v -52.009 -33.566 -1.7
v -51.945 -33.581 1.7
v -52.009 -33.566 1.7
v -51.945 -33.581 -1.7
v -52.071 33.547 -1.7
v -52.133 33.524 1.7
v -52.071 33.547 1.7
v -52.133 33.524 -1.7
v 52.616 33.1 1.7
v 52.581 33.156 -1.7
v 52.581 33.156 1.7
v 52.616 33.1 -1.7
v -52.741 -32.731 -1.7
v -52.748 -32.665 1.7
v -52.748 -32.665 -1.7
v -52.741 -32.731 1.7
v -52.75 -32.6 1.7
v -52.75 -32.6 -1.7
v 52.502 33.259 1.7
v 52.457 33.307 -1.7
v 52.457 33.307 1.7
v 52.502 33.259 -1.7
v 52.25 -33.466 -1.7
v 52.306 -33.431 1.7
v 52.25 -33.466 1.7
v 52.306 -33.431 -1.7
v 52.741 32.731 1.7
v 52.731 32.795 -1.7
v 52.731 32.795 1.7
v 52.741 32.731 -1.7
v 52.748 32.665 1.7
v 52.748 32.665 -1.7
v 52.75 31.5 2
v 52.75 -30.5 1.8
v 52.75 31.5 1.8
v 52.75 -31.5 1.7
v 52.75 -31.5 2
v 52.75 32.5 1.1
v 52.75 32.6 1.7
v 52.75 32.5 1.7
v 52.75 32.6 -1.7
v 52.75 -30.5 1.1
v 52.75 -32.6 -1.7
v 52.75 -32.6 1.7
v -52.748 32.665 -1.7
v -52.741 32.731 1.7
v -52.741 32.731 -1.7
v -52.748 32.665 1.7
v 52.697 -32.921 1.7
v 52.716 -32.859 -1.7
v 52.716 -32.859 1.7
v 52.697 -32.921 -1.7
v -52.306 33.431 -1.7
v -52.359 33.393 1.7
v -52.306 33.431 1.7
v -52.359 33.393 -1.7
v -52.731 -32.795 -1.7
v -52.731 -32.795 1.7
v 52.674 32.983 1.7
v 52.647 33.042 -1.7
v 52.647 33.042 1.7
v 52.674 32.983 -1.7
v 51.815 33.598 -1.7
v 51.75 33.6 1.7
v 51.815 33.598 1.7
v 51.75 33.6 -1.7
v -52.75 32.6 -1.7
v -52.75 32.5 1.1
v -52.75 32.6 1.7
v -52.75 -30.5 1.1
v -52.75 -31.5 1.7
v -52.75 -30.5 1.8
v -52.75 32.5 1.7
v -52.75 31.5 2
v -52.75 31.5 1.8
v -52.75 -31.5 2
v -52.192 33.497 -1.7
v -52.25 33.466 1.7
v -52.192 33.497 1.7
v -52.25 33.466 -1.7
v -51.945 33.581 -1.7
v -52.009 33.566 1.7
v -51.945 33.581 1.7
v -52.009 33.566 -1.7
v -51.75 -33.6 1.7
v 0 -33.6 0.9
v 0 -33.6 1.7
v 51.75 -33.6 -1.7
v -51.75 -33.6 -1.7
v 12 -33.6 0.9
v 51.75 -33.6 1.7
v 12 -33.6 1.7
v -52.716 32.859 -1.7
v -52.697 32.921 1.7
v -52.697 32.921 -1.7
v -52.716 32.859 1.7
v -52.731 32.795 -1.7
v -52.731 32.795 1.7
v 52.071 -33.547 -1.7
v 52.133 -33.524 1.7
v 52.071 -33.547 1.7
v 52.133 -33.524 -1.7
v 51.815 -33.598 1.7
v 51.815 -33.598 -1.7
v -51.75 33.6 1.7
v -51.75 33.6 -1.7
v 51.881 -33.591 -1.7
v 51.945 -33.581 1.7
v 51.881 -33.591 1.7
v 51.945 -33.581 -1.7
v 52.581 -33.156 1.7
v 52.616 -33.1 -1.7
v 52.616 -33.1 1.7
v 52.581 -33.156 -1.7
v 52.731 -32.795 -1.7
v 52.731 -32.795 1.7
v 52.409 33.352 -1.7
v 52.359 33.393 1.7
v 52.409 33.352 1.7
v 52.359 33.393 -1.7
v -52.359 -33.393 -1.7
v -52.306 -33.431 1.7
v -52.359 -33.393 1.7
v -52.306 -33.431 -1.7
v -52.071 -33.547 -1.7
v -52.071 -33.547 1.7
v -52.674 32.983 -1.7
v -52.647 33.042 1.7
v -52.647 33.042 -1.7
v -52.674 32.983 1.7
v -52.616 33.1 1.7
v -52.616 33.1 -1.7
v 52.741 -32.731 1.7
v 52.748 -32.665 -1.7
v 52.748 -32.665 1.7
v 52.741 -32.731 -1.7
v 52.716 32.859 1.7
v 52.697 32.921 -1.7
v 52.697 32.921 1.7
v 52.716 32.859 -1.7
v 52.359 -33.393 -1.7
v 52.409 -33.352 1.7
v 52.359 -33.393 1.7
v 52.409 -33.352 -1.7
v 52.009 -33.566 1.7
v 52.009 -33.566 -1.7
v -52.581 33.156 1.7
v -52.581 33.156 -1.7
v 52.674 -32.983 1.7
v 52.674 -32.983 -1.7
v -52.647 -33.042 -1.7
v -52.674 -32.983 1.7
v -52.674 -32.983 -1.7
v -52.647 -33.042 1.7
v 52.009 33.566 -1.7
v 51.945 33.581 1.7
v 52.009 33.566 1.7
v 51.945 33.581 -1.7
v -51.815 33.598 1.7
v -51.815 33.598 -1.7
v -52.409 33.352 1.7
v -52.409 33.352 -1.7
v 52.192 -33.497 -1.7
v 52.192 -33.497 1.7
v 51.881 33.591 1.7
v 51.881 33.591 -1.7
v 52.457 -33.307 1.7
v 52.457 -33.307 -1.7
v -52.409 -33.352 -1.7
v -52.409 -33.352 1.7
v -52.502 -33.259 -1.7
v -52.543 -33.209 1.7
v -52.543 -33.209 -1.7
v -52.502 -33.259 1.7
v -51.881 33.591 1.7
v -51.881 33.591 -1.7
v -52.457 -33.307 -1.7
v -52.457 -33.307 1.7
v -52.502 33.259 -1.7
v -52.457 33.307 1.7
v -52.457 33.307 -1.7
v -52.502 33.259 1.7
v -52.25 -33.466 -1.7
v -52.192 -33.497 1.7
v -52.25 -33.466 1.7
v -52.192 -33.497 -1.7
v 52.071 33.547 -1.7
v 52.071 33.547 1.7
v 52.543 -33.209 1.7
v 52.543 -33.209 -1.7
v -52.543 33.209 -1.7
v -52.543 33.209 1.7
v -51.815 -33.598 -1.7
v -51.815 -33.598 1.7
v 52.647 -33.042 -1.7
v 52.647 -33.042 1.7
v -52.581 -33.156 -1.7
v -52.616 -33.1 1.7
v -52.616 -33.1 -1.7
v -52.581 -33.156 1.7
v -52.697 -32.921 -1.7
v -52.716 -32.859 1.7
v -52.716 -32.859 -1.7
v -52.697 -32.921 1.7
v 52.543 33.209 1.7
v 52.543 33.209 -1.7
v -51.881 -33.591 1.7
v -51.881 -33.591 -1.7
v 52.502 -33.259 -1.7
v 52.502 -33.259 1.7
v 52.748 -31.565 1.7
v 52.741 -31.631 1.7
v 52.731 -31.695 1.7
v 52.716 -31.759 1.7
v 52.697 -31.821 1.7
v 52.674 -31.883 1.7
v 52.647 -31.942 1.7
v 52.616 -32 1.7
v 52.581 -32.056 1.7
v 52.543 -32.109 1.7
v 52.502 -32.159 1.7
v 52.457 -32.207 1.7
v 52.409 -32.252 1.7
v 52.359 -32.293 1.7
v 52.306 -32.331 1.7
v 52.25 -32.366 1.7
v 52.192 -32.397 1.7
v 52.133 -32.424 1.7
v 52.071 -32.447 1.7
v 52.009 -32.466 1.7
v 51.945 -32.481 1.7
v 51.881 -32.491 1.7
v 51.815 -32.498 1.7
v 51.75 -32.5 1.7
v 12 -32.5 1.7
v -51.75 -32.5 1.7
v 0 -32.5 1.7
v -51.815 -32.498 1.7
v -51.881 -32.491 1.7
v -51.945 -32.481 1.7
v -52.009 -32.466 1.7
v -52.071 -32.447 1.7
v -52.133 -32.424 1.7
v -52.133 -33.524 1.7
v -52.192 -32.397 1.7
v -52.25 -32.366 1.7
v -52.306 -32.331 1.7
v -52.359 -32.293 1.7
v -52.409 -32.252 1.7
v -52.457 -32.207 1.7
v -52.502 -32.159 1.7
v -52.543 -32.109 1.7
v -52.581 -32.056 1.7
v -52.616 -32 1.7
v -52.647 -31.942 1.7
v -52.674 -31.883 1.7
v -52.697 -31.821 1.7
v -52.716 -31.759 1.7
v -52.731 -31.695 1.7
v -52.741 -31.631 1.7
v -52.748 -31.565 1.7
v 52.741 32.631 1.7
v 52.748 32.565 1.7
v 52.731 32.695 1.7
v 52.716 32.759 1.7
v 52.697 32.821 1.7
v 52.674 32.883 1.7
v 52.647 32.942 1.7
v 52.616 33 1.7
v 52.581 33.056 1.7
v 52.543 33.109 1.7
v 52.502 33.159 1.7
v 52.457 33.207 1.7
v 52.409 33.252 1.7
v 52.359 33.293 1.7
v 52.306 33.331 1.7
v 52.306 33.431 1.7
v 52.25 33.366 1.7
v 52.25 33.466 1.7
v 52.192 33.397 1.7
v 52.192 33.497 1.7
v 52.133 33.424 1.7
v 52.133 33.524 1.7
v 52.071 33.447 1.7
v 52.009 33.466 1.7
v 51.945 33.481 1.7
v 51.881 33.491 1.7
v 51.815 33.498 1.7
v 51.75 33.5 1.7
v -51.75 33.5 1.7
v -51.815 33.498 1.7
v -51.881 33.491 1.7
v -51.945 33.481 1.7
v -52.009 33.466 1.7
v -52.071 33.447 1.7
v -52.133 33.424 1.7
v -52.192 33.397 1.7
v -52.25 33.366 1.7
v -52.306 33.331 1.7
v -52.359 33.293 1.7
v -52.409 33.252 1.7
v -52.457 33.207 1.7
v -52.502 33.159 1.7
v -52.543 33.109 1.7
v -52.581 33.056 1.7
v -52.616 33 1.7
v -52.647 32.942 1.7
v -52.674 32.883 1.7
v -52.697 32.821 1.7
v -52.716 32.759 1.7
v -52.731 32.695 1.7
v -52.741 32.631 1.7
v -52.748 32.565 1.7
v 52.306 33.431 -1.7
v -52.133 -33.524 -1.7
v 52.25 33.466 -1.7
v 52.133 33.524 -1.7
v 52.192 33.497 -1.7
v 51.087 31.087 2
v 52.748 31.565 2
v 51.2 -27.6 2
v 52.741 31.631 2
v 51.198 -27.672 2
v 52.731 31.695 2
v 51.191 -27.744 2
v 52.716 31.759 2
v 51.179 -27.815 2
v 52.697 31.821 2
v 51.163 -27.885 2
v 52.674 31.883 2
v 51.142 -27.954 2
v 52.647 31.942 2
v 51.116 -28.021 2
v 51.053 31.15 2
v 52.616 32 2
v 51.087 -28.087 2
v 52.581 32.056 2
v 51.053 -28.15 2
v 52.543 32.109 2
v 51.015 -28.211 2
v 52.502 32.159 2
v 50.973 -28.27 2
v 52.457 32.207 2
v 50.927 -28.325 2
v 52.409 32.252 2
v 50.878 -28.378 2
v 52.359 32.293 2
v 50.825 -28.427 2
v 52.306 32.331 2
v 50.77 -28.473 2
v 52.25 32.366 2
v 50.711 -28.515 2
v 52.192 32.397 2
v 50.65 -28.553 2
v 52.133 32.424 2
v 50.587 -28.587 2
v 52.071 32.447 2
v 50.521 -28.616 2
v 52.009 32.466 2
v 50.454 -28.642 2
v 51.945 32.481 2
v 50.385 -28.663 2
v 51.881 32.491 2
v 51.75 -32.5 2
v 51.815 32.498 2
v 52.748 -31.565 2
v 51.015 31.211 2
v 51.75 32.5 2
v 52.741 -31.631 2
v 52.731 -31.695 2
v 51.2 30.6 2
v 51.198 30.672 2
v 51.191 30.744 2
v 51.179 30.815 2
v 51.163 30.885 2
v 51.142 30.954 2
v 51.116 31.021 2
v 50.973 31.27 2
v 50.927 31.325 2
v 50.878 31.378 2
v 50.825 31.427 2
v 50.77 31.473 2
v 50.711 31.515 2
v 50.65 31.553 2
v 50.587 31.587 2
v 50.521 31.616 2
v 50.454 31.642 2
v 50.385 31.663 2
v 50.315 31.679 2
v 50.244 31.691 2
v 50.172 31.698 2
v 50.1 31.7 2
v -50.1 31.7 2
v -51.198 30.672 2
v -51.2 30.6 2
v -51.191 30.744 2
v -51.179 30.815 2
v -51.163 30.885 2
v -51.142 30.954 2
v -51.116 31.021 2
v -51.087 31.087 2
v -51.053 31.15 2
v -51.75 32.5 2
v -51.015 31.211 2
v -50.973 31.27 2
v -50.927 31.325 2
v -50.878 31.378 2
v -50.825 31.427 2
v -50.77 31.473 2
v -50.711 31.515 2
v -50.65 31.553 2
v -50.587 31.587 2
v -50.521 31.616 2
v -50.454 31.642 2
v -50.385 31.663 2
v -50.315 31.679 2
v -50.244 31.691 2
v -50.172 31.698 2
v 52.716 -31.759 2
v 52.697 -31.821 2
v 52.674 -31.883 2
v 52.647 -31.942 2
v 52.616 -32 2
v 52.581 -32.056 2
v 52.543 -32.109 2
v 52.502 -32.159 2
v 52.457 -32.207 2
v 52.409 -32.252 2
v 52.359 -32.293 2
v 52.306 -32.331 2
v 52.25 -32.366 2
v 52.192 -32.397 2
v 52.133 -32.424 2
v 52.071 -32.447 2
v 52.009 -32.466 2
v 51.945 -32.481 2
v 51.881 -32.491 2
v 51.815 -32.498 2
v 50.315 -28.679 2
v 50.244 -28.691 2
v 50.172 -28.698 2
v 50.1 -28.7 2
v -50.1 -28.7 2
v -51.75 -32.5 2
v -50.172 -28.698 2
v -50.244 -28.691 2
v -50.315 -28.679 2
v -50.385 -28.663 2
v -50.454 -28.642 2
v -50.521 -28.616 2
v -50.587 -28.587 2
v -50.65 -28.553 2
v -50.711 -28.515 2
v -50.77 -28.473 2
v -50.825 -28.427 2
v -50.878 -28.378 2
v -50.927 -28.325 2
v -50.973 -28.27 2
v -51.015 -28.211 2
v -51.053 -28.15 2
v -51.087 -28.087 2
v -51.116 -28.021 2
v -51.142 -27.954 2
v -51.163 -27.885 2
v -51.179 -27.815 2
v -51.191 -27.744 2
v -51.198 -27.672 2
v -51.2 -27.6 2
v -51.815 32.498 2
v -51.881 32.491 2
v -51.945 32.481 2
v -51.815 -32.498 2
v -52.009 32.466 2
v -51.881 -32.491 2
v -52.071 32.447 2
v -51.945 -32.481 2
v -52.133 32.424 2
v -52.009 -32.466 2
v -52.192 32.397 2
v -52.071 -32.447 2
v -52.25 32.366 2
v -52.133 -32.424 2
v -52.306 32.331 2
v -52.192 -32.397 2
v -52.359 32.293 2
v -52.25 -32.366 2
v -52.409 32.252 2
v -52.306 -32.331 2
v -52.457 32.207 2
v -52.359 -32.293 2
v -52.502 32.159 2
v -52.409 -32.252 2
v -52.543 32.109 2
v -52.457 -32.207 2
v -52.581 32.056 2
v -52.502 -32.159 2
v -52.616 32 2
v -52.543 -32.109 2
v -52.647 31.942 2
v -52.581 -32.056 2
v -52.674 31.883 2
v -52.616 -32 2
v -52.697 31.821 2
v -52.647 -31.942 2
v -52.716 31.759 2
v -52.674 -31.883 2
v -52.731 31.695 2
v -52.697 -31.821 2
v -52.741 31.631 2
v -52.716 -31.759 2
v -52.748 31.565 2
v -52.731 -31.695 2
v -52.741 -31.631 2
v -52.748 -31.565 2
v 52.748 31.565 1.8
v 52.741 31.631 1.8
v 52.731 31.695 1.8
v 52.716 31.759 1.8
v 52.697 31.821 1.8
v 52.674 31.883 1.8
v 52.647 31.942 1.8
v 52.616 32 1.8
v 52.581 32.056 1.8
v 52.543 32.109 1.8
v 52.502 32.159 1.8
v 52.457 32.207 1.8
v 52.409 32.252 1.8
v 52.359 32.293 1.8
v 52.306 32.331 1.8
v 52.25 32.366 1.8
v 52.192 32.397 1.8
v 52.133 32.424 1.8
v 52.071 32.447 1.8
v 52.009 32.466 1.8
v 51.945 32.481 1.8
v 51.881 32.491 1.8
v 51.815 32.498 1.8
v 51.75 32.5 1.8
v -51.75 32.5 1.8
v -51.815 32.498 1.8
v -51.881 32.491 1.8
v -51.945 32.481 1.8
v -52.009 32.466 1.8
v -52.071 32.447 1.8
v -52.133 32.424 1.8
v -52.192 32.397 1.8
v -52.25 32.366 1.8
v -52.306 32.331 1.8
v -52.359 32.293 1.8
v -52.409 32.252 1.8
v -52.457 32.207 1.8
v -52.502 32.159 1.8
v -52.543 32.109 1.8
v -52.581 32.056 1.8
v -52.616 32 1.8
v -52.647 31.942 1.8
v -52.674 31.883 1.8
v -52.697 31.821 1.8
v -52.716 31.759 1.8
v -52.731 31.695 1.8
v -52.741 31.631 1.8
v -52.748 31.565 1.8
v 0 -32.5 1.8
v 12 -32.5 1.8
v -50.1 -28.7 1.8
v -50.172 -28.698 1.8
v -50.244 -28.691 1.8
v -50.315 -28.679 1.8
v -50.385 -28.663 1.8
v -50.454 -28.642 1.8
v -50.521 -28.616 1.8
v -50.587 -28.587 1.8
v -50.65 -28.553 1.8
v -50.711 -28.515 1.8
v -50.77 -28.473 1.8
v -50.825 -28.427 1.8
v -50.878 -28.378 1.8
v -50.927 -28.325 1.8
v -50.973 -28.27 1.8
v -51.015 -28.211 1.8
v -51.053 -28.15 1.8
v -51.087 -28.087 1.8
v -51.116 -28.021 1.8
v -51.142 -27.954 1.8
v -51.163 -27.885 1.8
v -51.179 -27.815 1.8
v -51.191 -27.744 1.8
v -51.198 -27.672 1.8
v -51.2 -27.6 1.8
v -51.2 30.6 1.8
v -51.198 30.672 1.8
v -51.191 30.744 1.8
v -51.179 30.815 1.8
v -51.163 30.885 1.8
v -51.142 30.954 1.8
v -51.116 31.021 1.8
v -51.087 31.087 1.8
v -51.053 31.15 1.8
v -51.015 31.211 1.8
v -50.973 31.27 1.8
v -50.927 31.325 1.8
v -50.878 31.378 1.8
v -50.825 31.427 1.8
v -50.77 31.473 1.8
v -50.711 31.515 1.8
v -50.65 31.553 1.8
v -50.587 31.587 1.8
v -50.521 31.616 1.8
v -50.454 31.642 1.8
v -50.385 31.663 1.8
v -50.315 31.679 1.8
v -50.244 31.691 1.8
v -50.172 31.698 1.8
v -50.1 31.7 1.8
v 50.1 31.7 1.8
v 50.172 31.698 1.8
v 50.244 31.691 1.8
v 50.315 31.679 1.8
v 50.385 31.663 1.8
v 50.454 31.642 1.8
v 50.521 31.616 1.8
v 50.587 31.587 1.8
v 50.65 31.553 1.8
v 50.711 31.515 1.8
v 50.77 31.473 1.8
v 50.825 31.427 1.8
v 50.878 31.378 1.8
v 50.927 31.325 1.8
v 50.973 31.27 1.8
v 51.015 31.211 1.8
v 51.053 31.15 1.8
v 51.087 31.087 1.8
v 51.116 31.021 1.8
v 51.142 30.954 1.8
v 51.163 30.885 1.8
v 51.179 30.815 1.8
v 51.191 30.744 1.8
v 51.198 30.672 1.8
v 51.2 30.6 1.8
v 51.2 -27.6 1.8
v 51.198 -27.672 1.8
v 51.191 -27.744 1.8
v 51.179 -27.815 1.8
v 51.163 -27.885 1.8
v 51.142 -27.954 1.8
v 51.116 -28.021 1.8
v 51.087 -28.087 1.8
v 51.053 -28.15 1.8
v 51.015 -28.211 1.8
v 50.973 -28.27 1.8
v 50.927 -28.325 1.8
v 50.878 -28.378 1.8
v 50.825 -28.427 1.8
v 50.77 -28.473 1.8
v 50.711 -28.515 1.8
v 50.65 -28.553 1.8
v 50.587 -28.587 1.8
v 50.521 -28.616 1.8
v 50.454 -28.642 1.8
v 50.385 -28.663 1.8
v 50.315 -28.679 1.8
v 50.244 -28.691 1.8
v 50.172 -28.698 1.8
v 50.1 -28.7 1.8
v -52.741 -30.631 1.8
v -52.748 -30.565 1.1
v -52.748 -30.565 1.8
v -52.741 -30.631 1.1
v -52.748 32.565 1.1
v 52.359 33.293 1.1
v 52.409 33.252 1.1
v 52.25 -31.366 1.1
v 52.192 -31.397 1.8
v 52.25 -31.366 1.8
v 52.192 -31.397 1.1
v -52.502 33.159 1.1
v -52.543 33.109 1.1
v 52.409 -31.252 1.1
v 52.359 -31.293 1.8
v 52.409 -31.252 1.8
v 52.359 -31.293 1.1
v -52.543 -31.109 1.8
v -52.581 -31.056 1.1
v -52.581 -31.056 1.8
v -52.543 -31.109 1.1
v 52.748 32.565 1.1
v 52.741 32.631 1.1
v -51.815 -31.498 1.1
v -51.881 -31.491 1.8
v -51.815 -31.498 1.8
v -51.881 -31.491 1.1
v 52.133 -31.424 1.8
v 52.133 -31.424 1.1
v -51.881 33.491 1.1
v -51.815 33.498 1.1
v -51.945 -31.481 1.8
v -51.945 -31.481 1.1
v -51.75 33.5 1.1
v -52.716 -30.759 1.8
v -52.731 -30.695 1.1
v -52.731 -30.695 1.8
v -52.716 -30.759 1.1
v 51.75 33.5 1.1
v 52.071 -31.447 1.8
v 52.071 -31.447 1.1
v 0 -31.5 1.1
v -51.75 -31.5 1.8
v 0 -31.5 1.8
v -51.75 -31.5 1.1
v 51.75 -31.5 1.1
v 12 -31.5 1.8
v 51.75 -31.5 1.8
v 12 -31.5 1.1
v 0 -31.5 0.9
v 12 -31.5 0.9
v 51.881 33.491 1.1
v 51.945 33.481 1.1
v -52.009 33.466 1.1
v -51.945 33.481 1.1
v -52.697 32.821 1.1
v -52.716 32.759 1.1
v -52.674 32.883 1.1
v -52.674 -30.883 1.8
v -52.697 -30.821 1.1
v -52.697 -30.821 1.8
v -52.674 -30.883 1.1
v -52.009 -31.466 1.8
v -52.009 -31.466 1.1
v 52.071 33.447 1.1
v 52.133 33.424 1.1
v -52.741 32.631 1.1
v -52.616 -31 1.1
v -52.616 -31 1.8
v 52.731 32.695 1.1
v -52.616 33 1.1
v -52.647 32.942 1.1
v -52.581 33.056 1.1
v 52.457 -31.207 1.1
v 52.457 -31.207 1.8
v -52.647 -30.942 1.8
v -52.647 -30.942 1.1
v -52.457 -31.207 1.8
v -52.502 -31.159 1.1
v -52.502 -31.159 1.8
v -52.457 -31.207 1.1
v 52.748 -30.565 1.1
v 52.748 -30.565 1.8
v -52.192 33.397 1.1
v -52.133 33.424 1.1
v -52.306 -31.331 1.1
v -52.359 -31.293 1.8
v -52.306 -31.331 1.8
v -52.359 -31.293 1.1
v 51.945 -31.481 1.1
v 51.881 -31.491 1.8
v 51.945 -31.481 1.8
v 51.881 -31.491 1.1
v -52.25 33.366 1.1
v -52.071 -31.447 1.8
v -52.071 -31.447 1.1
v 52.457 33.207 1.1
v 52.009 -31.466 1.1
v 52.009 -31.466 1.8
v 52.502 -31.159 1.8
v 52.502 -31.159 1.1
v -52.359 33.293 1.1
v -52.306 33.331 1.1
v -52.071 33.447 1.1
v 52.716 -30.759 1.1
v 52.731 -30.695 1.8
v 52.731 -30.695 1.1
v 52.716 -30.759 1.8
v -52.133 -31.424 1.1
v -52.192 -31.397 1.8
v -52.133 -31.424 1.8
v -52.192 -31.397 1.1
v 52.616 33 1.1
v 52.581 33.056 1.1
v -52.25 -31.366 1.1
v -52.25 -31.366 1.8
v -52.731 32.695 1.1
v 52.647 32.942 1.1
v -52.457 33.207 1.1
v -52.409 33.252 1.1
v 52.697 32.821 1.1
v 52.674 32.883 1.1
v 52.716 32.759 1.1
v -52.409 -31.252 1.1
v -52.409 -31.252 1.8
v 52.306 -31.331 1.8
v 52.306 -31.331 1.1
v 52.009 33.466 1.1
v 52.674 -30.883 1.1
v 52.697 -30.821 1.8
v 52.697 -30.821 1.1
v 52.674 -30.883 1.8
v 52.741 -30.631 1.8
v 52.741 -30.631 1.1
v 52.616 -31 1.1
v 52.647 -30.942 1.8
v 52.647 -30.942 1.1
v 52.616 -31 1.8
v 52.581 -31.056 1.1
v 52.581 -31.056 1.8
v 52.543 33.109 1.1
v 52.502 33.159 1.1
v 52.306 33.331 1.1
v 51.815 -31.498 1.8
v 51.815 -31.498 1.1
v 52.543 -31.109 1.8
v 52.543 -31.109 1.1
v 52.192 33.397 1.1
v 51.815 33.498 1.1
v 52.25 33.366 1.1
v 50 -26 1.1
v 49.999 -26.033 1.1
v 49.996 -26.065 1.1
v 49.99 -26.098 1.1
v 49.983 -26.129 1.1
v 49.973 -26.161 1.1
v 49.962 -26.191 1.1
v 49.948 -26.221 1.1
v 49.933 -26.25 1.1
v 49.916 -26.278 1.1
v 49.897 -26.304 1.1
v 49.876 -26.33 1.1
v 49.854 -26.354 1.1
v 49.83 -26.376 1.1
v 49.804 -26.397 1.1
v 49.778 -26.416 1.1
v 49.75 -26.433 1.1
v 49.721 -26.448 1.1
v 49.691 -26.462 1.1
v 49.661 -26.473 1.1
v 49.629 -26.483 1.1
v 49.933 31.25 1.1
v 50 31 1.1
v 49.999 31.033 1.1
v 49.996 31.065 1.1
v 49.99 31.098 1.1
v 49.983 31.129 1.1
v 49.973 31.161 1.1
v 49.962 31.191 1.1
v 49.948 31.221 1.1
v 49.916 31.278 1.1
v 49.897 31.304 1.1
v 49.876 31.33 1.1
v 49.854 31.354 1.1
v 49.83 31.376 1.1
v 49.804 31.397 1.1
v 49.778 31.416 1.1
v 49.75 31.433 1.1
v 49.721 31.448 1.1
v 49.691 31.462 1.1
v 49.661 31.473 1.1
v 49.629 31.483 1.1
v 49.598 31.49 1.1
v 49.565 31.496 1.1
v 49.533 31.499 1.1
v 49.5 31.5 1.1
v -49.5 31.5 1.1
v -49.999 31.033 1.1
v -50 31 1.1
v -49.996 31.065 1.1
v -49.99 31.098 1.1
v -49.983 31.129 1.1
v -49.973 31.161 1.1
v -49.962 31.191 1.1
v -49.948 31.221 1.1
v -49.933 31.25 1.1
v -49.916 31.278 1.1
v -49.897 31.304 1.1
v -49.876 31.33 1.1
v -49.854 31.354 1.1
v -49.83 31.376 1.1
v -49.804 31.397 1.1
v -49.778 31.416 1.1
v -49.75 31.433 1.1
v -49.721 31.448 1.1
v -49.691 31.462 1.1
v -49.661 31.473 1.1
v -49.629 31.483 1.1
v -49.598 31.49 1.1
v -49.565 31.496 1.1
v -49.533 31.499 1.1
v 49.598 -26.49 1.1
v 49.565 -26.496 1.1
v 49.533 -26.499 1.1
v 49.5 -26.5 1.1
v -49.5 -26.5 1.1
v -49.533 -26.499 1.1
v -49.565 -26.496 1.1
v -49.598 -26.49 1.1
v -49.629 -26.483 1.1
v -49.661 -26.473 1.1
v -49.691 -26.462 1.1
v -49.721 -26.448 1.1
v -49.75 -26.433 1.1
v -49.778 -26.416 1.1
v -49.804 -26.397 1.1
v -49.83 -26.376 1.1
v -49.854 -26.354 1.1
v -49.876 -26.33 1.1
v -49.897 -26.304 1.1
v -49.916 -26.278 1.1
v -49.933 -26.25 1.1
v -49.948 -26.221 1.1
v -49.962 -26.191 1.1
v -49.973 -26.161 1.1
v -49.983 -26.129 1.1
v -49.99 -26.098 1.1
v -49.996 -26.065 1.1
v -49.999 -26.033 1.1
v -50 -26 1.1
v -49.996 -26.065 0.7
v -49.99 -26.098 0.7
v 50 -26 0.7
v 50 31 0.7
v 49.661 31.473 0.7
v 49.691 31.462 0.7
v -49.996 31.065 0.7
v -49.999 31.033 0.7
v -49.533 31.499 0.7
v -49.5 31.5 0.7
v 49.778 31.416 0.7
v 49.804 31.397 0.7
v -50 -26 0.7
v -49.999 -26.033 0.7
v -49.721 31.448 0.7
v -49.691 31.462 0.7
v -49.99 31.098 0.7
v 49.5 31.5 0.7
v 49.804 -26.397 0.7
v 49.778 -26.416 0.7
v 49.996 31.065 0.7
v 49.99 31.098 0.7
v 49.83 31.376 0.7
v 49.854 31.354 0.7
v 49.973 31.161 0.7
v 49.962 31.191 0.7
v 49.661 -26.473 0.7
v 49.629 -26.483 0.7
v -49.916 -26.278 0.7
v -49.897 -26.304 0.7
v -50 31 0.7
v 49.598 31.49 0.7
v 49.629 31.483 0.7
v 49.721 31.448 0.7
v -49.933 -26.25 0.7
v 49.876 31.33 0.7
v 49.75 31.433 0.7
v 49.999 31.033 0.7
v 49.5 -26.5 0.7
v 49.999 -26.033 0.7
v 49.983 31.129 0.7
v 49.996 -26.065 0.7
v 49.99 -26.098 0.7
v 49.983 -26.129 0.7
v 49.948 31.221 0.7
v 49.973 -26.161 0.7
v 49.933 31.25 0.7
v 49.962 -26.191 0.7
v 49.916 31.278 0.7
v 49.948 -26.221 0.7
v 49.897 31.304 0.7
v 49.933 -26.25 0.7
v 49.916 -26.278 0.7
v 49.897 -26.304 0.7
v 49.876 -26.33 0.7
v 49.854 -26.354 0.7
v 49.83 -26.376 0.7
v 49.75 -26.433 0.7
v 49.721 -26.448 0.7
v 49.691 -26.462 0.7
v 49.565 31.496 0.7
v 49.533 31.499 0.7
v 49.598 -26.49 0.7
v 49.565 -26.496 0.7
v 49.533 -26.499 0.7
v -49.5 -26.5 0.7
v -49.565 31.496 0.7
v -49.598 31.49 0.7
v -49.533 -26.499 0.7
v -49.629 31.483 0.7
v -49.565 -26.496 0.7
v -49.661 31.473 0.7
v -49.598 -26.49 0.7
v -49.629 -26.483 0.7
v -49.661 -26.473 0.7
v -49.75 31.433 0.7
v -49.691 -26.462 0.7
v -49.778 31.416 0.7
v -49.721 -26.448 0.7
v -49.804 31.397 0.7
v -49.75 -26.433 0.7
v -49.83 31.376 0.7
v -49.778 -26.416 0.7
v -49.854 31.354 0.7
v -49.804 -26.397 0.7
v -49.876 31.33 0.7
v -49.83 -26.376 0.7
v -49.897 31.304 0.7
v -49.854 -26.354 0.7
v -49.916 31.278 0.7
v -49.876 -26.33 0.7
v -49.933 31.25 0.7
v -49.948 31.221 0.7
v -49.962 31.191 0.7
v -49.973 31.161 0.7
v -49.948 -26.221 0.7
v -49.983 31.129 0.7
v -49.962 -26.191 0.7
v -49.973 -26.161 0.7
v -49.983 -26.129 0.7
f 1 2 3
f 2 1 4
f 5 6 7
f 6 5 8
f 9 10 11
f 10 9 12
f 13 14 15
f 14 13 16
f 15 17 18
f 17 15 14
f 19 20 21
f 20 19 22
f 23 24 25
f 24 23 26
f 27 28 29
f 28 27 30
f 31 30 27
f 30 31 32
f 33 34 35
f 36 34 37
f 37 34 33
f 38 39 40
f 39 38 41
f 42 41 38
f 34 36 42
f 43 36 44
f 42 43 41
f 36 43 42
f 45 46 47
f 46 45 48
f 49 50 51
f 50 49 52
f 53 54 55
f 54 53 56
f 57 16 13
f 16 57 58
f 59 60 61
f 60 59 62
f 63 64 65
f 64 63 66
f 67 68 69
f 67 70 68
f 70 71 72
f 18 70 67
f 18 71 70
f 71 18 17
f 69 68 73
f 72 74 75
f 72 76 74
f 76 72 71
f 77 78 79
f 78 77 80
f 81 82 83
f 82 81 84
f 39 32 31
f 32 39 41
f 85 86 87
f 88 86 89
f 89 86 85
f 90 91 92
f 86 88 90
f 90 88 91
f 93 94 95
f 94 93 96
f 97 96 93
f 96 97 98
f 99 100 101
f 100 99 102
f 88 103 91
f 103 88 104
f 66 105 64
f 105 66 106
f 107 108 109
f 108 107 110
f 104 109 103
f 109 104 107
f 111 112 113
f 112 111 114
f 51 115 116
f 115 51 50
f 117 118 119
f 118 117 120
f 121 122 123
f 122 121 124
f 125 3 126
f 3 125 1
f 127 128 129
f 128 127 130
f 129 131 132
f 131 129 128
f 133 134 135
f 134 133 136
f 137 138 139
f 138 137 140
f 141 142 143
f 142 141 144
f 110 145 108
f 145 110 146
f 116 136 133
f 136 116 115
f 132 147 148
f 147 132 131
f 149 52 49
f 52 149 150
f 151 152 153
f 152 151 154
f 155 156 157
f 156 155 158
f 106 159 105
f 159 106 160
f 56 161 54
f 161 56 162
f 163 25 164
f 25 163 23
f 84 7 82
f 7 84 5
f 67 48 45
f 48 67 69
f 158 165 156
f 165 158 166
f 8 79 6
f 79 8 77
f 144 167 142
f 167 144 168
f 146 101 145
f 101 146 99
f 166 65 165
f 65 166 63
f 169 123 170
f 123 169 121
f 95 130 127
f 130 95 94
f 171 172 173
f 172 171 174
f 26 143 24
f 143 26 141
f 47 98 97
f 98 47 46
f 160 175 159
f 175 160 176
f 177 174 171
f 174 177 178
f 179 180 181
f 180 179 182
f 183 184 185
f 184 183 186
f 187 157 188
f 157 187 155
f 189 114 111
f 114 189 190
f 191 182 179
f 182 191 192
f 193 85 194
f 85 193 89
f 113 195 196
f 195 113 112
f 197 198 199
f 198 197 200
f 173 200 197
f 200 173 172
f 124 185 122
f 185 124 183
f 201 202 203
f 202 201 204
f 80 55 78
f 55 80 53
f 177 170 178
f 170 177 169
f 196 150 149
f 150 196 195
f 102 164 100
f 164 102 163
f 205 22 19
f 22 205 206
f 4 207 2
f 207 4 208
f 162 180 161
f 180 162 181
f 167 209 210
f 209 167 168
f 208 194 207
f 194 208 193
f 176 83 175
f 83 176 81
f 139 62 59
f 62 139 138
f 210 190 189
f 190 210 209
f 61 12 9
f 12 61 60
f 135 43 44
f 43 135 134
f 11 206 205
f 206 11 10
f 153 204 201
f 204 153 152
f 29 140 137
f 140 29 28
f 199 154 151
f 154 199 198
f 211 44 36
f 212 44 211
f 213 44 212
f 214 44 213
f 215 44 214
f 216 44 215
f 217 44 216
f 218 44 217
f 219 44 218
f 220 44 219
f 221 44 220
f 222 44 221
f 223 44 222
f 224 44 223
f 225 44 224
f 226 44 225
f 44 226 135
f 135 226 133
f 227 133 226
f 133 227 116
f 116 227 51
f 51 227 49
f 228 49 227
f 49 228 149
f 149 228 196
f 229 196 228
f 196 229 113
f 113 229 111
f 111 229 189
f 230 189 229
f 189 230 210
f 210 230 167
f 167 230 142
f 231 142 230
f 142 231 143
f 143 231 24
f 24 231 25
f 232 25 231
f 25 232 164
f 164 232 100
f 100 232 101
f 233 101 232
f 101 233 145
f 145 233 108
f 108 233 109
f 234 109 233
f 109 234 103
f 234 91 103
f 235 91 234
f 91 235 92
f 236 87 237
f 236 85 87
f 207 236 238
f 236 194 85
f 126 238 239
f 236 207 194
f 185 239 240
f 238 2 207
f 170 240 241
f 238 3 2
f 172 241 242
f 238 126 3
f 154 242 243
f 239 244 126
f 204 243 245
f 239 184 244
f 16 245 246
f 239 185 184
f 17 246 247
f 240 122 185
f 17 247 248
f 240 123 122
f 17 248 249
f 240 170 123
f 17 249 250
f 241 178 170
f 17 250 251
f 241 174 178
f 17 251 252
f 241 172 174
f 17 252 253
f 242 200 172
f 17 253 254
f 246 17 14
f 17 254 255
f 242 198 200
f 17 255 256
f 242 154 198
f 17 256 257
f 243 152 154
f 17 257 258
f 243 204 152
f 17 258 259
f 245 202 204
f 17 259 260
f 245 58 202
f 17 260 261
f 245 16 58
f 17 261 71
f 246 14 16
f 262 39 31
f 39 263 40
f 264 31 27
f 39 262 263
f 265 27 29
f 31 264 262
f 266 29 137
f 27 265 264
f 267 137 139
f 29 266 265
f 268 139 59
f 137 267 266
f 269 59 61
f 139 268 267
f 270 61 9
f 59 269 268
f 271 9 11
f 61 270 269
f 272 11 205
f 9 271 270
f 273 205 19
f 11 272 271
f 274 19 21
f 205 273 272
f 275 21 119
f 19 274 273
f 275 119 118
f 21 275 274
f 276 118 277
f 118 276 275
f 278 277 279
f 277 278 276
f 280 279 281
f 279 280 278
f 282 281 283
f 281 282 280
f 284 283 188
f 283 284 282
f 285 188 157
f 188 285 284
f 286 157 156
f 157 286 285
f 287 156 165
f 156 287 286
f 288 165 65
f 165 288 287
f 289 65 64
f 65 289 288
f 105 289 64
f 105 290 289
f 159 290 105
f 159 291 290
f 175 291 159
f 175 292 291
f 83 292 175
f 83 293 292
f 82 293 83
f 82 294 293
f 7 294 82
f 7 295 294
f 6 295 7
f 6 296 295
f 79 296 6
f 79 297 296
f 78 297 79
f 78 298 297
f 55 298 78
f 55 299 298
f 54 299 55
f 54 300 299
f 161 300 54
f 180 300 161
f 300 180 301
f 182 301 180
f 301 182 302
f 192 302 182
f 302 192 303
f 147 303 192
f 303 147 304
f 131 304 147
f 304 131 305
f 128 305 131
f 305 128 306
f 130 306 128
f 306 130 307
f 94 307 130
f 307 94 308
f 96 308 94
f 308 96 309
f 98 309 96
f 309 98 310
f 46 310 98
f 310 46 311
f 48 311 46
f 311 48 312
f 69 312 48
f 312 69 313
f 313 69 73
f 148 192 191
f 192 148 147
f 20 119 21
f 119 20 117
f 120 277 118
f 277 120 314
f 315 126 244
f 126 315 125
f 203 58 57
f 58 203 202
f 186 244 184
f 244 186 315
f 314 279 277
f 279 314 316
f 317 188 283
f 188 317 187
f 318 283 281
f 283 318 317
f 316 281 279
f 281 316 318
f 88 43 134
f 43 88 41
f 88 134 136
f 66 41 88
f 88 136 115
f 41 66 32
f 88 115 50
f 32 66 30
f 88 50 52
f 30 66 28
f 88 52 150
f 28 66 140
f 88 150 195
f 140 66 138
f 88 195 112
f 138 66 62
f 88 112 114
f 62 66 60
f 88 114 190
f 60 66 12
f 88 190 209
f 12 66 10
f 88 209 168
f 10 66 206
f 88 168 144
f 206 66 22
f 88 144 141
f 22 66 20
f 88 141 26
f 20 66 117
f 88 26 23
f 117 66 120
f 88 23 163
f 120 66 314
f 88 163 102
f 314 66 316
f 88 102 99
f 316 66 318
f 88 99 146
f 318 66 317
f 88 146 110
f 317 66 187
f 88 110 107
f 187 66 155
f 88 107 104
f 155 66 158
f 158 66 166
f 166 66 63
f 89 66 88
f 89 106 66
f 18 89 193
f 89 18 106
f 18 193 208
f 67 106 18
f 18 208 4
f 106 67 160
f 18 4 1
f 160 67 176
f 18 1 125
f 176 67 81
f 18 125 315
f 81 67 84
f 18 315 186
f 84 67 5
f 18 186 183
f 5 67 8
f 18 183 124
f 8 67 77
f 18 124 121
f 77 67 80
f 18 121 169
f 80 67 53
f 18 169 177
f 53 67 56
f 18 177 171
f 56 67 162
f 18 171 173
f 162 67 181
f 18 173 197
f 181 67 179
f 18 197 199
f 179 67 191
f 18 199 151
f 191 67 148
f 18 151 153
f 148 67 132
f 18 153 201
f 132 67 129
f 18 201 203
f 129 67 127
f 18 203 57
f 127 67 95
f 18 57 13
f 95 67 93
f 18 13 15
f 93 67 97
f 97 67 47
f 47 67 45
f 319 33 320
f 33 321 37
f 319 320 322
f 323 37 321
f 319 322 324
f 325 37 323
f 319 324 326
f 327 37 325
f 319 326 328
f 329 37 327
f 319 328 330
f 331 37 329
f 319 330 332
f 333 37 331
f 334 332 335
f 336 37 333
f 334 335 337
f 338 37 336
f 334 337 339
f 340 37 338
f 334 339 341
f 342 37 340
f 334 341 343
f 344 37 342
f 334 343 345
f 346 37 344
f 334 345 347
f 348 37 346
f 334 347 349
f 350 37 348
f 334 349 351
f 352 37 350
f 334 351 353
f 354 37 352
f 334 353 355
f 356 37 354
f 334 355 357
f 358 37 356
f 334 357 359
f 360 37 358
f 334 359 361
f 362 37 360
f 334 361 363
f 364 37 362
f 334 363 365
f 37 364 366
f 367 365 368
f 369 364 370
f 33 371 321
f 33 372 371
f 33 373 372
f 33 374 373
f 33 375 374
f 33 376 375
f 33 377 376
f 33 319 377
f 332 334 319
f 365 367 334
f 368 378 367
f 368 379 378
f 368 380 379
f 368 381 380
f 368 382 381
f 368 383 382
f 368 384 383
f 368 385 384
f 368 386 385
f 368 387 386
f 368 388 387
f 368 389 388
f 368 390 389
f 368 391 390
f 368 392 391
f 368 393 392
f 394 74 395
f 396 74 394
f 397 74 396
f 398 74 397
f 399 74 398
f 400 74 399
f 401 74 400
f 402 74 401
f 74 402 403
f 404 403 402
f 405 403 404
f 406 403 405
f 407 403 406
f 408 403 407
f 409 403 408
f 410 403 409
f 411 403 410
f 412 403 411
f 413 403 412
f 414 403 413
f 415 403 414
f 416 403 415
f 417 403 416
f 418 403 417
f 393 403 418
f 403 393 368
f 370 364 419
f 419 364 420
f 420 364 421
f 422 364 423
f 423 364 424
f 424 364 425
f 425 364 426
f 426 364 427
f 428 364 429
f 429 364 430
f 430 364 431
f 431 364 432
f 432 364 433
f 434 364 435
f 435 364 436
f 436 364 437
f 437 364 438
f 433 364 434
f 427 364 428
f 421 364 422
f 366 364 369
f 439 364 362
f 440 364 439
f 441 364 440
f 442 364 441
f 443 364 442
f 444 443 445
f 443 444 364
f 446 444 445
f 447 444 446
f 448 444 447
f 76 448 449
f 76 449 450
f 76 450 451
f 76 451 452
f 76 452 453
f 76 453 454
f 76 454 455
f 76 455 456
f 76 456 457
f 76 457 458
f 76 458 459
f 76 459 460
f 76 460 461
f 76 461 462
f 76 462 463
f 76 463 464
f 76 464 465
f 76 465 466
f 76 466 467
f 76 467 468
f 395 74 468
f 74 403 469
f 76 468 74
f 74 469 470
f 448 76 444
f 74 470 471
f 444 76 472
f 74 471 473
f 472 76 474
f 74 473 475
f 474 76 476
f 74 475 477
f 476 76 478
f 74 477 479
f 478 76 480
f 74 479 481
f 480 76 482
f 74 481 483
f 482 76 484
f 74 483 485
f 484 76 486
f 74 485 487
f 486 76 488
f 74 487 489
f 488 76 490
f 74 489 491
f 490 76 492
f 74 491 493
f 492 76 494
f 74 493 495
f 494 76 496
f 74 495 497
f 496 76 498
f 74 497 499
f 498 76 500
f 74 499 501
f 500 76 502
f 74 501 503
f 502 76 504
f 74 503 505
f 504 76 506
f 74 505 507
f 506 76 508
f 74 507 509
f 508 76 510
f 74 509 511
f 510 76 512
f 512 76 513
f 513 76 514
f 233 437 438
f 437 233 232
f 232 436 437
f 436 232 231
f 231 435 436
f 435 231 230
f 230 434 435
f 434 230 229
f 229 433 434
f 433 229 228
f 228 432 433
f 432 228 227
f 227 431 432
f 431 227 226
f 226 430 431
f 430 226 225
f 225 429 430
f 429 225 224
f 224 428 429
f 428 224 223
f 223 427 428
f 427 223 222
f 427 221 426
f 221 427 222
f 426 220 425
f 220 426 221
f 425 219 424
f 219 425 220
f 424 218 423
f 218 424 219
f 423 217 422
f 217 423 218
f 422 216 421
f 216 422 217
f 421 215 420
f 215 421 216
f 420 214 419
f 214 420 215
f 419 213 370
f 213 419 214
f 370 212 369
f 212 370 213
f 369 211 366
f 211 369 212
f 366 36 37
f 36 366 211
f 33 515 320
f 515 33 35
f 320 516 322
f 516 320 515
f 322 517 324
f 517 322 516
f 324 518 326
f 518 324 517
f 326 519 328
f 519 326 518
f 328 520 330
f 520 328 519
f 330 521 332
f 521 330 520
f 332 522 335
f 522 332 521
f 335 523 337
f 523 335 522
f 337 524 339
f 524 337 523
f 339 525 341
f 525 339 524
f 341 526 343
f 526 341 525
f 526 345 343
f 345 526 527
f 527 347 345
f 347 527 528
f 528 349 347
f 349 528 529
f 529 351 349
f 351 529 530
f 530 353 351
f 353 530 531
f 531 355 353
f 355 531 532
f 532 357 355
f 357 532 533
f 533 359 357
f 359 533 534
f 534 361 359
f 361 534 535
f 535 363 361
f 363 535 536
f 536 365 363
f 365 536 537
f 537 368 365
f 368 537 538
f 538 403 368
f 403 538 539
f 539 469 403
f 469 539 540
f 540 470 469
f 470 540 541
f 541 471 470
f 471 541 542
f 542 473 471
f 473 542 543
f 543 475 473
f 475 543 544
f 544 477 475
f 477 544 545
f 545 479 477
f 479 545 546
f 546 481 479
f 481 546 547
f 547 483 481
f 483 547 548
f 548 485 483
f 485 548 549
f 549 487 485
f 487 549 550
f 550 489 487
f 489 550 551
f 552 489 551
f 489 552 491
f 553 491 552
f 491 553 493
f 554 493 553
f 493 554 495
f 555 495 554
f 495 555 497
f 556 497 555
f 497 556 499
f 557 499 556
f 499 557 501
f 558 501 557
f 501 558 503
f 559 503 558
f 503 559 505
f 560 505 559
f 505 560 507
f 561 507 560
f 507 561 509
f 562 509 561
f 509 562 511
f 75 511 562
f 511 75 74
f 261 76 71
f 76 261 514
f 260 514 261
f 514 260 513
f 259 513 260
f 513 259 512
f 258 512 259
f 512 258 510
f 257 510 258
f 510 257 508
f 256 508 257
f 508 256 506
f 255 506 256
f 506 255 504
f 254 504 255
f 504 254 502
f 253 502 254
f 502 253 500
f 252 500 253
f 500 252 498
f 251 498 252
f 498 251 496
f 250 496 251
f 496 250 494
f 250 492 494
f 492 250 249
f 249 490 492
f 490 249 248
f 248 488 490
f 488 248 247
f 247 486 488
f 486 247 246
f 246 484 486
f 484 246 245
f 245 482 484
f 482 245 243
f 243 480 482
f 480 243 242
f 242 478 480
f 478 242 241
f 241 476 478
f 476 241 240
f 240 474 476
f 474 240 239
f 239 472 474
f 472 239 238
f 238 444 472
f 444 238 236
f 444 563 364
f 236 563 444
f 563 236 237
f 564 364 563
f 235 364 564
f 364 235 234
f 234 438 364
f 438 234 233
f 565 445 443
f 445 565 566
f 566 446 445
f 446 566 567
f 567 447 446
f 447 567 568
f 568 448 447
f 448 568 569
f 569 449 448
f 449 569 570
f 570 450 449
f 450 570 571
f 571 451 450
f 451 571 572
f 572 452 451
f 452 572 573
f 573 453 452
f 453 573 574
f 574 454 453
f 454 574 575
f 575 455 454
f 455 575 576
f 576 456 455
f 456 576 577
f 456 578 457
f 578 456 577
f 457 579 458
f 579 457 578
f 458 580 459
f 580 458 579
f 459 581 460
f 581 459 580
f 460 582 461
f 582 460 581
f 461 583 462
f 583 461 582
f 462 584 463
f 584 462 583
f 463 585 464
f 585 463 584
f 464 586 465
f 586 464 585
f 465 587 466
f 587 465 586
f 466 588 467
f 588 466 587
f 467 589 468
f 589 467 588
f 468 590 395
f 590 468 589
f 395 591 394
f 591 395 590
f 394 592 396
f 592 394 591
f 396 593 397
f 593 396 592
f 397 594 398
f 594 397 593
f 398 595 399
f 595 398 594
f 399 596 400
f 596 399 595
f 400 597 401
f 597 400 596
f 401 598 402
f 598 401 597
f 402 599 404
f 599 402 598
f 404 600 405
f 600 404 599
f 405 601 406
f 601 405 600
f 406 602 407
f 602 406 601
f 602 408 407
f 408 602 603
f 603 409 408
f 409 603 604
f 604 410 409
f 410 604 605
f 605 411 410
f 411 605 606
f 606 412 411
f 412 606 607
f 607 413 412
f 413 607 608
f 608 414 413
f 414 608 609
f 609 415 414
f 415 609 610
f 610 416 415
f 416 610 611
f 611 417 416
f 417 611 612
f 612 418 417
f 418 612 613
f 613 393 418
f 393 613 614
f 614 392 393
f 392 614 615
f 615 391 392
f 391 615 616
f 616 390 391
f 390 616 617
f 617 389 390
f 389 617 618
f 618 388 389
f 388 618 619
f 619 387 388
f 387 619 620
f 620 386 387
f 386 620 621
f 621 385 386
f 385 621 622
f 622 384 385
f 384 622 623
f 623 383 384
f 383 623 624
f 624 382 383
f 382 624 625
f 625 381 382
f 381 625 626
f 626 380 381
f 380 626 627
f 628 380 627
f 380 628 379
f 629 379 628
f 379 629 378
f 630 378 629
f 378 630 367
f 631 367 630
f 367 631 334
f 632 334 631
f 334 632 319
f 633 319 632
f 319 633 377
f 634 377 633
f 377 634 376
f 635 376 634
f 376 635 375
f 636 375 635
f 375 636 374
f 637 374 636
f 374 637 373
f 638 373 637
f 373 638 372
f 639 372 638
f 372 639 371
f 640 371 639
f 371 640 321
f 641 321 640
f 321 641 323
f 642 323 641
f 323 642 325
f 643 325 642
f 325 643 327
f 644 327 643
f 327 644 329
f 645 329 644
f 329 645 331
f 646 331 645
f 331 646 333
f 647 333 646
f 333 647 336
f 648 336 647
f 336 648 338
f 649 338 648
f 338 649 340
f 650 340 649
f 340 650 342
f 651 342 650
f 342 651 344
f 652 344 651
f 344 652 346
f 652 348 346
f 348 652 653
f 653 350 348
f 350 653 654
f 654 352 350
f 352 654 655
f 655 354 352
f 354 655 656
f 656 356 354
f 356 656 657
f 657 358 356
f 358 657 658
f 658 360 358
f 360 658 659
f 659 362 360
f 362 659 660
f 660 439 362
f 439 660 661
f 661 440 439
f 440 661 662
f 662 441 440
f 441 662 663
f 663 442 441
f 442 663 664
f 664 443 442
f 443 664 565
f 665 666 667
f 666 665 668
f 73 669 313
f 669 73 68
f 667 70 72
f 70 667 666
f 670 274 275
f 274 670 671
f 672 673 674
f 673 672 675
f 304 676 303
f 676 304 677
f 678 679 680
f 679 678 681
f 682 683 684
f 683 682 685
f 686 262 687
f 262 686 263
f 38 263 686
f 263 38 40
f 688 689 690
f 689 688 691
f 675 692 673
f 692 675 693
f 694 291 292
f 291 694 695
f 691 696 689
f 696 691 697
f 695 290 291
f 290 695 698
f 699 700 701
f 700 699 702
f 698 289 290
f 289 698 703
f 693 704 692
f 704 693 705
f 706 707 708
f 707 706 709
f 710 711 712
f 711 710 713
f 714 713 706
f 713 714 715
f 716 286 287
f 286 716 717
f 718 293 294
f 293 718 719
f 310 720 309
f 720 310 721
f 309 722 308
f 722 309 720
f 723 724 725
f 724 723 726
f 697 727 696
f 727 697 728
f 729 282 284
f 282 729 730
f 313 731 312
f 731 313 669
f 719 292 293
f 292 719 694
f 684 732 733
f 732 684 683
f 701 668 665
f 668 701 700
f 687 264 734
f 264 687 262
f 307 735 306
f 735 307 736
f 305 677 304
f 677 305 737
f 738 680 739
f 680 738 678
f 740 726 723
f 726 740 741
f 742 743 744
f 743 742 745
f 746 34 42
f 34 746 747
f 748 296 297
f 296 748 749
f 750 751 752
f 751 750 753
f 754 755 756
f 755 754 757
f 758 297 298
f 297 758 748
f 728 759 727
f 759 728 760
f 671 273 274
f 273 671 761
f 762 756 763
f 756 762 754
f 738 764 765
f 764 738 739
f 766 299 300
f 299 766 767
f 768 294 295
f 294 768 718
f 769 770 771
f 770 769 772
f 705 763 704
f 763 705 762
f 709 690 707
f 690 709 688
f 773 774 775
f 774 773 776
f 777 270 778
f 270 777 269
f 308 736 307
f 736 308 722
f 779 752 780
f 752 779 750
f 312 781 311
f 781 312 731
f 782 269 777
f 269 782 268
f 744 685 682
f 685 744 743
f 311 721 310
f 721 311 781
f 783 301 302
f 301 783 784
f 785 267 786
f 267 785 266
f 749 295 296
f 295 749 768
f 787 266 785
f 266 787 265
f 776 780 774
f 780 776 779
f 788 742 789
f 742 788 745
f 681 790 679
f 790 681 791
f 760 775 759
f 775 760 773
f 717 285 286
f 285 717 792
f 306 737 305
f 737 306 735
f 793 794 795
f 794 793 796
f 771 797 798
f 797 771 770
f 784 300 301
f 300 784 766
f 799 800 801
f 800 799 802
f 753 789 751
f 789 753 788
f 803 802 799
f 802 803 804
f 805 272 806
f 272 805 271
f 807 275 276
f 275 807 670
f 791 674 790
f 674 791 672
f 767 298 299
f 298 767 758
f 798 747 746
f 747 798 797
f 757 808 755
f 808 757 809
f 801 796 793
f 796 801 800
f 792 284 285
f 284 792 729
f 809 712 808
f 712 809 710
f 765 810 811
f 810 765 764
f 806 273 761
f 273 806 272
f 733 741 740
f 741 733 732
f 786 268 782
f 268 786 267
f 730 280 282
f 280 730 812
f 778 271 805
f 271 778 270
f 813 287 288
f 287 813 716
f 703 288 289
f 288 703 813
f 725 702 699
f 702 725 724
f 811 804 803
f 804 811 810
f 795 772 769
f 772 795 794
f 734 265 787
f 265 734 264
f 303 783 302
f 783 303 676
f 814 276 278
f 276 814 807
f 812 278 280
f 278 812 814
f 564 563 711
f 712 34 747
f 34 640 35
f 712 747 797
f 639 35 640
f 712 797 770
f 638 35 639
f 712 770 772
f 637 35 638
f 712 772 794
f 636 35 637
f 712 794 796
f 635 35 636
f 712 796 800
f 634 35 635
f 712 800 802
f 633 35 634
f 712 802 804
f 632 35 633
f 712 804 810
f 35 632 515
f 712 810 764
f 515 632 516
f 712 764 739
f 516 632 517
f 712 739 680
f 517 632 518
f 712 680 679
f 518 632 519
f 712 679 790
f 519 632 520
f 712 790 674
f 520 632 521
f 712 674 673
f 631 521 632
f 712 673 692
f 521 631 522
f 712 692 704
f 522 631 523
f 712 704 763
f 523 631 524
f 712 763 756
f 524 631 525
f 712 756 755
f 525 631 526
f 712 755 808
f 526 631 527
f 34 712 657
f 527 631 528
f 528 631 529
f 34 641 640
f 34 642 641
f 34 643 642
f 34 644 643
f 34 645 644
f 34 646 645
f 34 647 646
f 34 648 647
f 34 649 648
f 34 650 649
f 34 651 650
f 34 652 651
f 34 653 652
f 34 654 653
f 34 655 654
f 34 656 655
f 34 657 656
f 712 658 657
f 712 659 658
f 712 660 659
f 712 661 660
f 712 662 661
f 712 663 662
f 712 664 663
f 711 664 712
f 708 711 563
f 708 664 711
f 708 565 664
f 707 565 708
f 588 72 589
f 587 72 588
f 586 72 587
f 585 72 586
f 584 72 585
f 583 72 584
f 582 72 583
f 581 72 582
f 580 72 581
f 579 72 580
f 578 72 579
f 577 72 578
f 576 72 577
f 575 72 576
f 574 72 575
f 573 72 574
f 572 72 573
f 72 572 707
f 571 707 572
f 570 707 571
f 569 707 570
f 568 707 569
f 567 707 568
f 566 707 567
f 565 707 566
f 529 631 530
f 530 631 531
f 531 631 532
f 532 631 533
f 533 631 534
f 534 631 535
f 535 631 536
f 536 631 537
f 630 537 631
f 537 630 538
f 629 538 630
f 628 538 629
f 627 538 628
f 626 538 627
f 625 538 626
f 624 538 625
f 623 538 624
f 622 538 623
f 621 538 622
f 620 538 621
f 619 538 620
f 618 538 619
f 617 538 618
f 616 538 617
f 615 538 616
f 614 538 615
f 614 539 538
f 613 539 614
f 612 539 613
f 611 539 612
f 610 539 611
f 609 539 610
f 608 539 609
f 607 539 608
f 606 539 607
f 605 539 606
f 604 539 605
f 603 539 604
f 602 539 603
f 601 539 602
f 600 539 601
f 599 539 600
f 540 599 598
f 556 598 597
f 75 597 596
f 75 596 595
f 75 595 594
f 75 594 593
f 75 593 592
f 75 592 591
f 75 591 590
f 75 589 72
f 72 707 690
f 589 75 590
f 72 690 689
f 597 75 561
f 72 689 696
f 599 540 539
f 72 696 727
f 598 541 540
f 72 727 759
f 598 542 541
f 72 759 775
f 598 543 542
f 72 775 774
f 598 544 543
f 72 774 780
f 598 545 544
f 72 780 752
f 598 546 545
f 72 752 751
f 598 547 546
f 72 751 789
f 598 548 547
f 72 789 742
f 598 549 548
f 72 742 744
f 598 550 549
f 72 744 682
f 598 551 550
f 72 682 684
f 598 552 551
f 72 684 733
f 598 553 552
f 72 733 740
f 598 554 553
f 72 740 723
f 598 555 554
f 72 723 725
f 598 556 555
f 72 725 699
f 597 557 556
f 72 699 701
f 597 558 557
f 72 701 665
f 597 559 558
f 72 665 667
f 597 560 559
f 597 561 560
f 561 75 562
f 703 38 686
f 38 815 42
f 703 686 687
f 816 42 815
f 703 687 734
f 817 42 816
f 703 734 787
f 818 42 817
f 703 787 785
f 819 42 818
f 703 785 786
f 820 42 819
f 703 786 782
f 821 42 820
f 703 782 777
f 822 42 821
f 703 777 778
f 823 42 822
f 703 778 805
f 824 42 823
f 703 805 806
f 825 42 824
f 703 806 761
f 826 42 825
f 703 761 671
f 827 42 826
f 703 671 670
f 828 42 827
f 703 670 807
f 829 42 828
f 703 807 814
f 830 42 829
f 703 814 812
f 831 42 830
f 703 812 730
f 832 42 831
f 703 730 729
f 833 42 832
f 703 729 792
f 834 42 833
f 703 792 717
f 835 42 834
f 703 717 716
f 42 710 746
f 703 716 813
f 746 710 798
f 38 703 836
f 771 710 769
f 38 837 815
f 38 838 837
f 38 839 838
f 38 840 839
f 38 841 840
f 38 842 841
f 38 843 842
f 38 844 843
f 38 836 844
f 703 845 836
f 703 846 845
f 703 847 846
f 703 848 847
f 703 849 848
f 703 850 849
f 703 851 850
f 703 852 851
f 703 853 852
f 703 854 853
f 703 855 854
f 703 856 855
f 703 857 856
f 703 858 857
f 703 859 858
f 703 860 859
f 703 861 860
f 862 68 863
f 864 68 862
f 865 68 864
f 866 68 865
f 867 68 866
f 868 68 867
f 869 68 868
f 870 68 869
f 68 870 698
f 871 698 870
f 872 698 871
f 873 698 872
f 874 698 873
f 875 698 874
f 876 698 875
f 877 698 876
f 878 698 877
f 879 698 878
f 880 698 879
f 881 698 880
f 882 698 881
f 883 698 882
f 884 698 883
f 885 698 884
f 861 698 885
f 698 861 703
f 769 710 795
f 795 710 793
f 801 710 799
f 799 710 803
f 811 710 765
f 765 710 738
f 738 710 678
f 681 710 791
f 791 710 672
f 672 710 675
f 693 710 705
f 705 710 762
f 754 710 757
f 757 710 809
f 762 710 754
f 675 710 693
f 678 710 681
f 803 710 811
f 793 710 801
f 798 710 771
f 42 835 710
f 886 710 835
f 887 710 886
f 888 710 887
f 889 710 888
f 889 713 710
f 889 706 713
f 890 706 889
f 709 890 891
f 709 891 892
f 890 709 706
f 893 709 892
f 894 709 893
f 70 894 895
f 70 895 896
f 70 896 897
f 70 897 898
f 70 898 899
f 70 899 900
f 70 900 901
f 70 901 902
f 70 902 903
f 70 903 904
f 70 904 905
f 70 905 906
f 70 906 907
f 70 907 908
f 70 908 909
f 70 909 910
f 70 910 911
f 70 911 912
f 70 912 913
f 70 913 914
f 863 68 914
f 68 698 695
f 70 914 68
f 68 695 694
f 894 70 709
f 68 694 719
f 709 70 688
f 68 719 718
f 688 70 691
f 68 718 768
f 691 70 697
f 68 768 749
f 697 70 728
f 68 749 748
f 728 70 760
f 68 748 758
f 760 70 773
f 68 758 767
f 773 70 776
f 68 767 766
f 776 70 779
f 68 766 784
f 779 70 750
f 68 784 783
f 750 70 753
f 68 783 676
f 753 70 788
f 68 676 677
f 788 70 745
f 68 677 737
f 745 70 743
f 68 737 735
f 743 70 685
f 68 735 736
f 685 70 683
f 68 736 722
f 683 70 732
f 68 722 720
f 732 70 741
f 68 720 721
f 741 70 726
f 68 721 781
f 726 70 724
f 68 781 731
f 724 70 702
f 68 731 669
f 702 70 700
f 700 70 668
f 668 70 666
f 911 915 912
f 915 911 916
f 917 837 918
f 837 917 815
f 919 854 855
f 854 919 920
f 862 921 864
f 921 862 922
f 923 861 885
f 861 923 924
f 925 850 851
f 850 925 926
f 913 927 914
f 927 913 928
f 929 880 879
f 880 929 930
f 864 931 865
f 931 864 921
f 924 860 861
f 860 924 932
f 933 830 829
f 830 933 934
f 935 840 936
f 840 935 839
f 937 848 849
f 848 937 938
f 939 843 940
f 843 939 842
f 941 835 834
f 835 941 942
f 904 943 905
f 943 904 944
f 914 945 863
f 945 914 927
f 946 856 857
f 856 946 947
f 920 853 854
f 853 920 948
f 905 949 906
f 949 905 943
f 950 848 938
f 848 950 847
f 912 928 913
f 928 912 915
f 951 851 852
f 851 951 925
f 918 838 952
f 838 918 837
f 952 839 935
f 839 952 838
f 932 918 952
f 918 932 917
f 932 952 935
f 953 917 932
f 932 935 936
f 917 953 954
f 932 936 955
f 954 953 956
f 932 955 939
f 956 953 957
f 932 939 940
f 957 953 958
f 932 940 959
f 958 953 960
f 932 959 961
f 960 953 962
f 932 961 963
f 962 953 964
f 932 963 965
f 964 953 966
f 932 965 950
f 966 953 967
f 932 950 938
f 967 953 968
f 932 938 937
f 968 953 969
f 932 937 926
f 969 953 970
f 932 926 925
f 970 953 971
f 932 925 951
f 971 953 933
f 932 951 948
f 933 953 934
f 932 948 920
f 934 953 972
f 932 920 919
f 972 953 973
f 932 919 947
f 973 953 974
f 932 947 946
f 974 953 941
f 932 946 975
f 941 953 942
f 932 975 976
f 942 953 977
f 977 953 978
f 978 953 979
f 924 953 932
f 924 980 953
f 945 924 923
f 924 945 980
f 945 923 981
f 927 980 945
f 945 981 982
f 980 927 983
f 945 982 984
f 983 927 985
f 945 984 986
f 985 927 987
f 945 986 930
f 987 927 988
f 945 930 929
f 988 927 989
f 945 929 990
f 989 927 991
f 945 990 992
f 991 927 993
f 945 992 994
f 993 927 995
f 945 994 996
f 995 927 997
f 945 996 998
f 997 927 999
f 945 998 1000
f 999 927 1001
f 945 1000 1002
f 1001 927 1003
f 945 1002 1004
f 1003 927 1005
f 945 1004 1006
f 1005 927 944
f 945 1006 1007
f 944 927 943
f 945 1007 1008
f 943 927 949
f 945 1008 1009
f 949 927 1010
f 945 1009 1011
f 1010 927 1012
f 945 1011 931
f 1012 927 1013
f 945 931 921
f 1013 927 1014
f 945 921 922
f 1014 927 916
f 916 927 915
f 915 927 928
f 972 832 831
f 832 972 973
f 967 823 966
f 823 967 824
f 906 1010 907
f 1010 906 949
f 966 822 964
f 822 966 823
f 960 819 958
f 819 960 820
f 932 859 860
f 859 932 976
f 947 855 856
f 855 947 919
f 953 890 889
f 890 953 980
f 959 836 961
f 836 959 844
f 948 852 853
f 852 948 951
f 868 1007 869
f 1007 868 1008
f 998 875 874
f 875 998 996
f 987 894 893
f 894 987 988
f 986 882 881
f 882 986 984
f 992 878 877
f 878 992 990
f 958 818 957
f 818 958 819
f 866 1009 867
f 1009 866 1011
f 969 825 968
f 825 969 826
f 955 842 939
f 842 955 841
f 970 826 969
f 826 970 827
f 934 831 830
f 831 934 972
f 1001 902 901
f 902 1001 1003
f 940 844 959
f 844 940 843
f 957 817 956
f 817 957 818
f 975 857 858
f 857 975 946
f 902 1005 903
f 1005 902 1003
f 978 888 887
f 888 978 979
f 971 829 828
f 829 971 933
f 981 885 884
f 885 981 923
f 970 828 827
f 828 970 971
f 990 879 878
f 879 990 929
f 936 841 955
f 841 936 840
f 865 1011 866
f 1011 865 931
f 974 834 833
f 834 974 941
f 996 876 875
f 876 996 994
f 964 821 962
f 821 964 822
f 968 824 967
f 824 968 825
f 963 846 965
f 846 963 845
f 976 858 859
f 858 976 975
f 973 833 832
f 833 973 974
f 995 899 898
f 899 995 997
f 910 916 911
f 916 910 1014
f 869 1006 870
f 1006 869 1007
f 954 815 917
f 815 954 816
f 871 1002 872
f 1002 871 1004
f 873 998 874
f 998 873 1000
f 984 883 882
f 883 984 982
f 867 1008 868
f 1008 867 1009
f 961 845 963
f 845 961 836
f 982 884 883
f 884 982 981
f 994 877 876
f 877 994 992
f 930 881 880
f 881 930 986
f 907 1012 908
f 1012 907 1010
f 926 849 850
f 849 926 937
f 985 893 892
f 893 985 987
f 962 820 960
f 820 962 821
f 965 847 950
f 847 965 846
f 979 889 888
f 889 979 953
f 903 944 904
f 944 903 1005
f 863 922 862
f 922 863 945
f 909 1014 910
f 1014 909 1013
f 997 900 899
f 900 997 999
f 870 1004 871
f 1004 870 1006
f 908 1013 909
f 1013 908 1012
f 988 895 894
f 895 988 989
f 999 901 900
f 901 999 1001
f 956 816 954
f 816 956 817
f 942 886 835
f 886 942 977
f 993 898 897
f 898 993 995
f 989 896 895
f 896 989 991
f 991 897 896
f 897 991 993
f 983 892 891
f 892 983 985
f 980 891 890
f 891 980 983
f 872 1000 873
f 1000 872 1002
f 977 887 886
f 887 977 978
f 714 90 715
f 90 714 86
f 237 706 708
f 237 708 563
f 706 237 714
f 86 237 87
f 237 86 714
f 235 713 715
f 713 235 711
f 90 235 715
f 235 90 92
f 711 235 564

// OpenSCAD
$fn = 96;

// Robust rounded rectangle (no offset degeneracy)
module rounded_rect_2d(w, h, r) {
    r2 = min(r, min(w, h)/2);
    hull() {
        for (sx = [-1, 1], sy = [-1, 1])
            translate([sx*(w/2 - r2), sy*(h/2 - r2)])
                circle(r = r2);
    }
}

module lcd_display_4p3() {
    // Overall dimensions (mm)
    body_w = 105.5;
    body_h = 67.2;
    body_t = 3.4;

    // Screen window from given coords
    win_x1 = -50;
    win_y1 = -26.5;
    win_x2 =  50;
    win_y2 =  31.5;
    win_r  = 0.5;

    win_w  = win_x2 - win_x1;
    win_h  = win_y2 - win_y1;
    win_cx = (win_x1 + win_x2)/2;
    win_cy = (win_y1 + win_y2)/2;

    // Inner recess from given coords
    rec_x1 = -body_w/2;
    rec_y1 = -65/2 + 1;
    rec_x2 =  body_w/2;
    rec_y2 =  65/2 + 1;
    rec_r  = 1;

    rec_w  = rec_x2 - rec_x1;
    rec_h  = rec_y2 - rec_y1;
    rec_cx = (rec_x1 + rec_x2)/2;
    rec_cy = (rec_y1 + rec_y2)/2;

    // Small feature (slot) from given coords
    slot_x1 = 0;
    slot_y1 = -34.5;
    slot_x2 = 12;
    slot_y2 = -31.5;

    slot_w  = abs(slot_x2 - slot_x1);
    slot_h  = abs(slot_y2 - slot_y1);
    slot_cx = (slot_x1 + slot_x2)/2;
    slot_cy = (slot_y1 + slot_y2)/2;

    // Depths (kept within body thickness)
    // Make recesses clearly visible but not through-cut.
    rec_depth  = min(0.6, body_t - 0.4);
    win_depth  = min(1.0, body_t - 0.4);
    slot_depth = min(0.8, body_t - 0.4);

    // Add a raised bezel ring so the model isn't just a slab.
    bezel_h = min(0.35, body_t * 0.25);
    bezel_r = 1.0;

    // Bezel ring geometry derived from given recess rectangle
    bezel_outer_w = rec_w;
    bezel_outer_h = rec_h;
    bezel_inner_w = win_w + 2*1.2;   // small border around window
    bezel_inner_h = win_h + 2*1.2;
    bezel_inner_r = win_r + 0.6;

    eps = 0.05;

    // ONE connected solid: base + raised bezel, with carved pockets/slot
    color([0.15, 0.15, 0.15])
    difference() {
        union() {
            // Main body centered on Z=0 for reliable viewing
            linear_extrude(height = body_t, center = true)
                rounded_rect_2d(body_w, body_h, 1.0);

            // Raised bezel ring on the front face (connected with slight overlap)
            translate([0, 0, body_t/2 + bezel_h/2 - eps])
                linear_extrude(height = bezel_h, center = true)
                    difference() {
                        rounded_rect_2d(bezel_outer_w, bezel_outer_h, bezel_r);
                        translate([win_cx - rec_cx, win_cy - rec_cy])
                            rounded_rect_2d(bezel_inner_w, bezel_inner_h, bezel_inner_r);
                    }
        }

        // Inner recess (shallow pocket from front face)
        translate([rec_cx, rec_cy, body_t/2 - rec_depth/2 + eps])
            linear_extrude(height = rec_depth + 2*eps, center = true)
                rounded_rect_2d(rec_w, rec_h, rec_r);

        // Screen window pocket (deeper pocket from front face)
        translate([win_cx, win_cy, body_t/2 - win_depth/2 + eps])
            linear_extrude(height = win_depth + 2*eps, center = true)
                rounded_rect_2d(win_w, win_h, win_r);

        // Small slot/feature cut (from front face)
        translate([slot_cx, slot_cy, body_t/2 - slot_depth/2 + eps])
            linear_extrude(height = slot_depth + 2*eps, center = true)
                square([slot_w, slot_h], center = true);
    }
}

lcd_display_4p3();
